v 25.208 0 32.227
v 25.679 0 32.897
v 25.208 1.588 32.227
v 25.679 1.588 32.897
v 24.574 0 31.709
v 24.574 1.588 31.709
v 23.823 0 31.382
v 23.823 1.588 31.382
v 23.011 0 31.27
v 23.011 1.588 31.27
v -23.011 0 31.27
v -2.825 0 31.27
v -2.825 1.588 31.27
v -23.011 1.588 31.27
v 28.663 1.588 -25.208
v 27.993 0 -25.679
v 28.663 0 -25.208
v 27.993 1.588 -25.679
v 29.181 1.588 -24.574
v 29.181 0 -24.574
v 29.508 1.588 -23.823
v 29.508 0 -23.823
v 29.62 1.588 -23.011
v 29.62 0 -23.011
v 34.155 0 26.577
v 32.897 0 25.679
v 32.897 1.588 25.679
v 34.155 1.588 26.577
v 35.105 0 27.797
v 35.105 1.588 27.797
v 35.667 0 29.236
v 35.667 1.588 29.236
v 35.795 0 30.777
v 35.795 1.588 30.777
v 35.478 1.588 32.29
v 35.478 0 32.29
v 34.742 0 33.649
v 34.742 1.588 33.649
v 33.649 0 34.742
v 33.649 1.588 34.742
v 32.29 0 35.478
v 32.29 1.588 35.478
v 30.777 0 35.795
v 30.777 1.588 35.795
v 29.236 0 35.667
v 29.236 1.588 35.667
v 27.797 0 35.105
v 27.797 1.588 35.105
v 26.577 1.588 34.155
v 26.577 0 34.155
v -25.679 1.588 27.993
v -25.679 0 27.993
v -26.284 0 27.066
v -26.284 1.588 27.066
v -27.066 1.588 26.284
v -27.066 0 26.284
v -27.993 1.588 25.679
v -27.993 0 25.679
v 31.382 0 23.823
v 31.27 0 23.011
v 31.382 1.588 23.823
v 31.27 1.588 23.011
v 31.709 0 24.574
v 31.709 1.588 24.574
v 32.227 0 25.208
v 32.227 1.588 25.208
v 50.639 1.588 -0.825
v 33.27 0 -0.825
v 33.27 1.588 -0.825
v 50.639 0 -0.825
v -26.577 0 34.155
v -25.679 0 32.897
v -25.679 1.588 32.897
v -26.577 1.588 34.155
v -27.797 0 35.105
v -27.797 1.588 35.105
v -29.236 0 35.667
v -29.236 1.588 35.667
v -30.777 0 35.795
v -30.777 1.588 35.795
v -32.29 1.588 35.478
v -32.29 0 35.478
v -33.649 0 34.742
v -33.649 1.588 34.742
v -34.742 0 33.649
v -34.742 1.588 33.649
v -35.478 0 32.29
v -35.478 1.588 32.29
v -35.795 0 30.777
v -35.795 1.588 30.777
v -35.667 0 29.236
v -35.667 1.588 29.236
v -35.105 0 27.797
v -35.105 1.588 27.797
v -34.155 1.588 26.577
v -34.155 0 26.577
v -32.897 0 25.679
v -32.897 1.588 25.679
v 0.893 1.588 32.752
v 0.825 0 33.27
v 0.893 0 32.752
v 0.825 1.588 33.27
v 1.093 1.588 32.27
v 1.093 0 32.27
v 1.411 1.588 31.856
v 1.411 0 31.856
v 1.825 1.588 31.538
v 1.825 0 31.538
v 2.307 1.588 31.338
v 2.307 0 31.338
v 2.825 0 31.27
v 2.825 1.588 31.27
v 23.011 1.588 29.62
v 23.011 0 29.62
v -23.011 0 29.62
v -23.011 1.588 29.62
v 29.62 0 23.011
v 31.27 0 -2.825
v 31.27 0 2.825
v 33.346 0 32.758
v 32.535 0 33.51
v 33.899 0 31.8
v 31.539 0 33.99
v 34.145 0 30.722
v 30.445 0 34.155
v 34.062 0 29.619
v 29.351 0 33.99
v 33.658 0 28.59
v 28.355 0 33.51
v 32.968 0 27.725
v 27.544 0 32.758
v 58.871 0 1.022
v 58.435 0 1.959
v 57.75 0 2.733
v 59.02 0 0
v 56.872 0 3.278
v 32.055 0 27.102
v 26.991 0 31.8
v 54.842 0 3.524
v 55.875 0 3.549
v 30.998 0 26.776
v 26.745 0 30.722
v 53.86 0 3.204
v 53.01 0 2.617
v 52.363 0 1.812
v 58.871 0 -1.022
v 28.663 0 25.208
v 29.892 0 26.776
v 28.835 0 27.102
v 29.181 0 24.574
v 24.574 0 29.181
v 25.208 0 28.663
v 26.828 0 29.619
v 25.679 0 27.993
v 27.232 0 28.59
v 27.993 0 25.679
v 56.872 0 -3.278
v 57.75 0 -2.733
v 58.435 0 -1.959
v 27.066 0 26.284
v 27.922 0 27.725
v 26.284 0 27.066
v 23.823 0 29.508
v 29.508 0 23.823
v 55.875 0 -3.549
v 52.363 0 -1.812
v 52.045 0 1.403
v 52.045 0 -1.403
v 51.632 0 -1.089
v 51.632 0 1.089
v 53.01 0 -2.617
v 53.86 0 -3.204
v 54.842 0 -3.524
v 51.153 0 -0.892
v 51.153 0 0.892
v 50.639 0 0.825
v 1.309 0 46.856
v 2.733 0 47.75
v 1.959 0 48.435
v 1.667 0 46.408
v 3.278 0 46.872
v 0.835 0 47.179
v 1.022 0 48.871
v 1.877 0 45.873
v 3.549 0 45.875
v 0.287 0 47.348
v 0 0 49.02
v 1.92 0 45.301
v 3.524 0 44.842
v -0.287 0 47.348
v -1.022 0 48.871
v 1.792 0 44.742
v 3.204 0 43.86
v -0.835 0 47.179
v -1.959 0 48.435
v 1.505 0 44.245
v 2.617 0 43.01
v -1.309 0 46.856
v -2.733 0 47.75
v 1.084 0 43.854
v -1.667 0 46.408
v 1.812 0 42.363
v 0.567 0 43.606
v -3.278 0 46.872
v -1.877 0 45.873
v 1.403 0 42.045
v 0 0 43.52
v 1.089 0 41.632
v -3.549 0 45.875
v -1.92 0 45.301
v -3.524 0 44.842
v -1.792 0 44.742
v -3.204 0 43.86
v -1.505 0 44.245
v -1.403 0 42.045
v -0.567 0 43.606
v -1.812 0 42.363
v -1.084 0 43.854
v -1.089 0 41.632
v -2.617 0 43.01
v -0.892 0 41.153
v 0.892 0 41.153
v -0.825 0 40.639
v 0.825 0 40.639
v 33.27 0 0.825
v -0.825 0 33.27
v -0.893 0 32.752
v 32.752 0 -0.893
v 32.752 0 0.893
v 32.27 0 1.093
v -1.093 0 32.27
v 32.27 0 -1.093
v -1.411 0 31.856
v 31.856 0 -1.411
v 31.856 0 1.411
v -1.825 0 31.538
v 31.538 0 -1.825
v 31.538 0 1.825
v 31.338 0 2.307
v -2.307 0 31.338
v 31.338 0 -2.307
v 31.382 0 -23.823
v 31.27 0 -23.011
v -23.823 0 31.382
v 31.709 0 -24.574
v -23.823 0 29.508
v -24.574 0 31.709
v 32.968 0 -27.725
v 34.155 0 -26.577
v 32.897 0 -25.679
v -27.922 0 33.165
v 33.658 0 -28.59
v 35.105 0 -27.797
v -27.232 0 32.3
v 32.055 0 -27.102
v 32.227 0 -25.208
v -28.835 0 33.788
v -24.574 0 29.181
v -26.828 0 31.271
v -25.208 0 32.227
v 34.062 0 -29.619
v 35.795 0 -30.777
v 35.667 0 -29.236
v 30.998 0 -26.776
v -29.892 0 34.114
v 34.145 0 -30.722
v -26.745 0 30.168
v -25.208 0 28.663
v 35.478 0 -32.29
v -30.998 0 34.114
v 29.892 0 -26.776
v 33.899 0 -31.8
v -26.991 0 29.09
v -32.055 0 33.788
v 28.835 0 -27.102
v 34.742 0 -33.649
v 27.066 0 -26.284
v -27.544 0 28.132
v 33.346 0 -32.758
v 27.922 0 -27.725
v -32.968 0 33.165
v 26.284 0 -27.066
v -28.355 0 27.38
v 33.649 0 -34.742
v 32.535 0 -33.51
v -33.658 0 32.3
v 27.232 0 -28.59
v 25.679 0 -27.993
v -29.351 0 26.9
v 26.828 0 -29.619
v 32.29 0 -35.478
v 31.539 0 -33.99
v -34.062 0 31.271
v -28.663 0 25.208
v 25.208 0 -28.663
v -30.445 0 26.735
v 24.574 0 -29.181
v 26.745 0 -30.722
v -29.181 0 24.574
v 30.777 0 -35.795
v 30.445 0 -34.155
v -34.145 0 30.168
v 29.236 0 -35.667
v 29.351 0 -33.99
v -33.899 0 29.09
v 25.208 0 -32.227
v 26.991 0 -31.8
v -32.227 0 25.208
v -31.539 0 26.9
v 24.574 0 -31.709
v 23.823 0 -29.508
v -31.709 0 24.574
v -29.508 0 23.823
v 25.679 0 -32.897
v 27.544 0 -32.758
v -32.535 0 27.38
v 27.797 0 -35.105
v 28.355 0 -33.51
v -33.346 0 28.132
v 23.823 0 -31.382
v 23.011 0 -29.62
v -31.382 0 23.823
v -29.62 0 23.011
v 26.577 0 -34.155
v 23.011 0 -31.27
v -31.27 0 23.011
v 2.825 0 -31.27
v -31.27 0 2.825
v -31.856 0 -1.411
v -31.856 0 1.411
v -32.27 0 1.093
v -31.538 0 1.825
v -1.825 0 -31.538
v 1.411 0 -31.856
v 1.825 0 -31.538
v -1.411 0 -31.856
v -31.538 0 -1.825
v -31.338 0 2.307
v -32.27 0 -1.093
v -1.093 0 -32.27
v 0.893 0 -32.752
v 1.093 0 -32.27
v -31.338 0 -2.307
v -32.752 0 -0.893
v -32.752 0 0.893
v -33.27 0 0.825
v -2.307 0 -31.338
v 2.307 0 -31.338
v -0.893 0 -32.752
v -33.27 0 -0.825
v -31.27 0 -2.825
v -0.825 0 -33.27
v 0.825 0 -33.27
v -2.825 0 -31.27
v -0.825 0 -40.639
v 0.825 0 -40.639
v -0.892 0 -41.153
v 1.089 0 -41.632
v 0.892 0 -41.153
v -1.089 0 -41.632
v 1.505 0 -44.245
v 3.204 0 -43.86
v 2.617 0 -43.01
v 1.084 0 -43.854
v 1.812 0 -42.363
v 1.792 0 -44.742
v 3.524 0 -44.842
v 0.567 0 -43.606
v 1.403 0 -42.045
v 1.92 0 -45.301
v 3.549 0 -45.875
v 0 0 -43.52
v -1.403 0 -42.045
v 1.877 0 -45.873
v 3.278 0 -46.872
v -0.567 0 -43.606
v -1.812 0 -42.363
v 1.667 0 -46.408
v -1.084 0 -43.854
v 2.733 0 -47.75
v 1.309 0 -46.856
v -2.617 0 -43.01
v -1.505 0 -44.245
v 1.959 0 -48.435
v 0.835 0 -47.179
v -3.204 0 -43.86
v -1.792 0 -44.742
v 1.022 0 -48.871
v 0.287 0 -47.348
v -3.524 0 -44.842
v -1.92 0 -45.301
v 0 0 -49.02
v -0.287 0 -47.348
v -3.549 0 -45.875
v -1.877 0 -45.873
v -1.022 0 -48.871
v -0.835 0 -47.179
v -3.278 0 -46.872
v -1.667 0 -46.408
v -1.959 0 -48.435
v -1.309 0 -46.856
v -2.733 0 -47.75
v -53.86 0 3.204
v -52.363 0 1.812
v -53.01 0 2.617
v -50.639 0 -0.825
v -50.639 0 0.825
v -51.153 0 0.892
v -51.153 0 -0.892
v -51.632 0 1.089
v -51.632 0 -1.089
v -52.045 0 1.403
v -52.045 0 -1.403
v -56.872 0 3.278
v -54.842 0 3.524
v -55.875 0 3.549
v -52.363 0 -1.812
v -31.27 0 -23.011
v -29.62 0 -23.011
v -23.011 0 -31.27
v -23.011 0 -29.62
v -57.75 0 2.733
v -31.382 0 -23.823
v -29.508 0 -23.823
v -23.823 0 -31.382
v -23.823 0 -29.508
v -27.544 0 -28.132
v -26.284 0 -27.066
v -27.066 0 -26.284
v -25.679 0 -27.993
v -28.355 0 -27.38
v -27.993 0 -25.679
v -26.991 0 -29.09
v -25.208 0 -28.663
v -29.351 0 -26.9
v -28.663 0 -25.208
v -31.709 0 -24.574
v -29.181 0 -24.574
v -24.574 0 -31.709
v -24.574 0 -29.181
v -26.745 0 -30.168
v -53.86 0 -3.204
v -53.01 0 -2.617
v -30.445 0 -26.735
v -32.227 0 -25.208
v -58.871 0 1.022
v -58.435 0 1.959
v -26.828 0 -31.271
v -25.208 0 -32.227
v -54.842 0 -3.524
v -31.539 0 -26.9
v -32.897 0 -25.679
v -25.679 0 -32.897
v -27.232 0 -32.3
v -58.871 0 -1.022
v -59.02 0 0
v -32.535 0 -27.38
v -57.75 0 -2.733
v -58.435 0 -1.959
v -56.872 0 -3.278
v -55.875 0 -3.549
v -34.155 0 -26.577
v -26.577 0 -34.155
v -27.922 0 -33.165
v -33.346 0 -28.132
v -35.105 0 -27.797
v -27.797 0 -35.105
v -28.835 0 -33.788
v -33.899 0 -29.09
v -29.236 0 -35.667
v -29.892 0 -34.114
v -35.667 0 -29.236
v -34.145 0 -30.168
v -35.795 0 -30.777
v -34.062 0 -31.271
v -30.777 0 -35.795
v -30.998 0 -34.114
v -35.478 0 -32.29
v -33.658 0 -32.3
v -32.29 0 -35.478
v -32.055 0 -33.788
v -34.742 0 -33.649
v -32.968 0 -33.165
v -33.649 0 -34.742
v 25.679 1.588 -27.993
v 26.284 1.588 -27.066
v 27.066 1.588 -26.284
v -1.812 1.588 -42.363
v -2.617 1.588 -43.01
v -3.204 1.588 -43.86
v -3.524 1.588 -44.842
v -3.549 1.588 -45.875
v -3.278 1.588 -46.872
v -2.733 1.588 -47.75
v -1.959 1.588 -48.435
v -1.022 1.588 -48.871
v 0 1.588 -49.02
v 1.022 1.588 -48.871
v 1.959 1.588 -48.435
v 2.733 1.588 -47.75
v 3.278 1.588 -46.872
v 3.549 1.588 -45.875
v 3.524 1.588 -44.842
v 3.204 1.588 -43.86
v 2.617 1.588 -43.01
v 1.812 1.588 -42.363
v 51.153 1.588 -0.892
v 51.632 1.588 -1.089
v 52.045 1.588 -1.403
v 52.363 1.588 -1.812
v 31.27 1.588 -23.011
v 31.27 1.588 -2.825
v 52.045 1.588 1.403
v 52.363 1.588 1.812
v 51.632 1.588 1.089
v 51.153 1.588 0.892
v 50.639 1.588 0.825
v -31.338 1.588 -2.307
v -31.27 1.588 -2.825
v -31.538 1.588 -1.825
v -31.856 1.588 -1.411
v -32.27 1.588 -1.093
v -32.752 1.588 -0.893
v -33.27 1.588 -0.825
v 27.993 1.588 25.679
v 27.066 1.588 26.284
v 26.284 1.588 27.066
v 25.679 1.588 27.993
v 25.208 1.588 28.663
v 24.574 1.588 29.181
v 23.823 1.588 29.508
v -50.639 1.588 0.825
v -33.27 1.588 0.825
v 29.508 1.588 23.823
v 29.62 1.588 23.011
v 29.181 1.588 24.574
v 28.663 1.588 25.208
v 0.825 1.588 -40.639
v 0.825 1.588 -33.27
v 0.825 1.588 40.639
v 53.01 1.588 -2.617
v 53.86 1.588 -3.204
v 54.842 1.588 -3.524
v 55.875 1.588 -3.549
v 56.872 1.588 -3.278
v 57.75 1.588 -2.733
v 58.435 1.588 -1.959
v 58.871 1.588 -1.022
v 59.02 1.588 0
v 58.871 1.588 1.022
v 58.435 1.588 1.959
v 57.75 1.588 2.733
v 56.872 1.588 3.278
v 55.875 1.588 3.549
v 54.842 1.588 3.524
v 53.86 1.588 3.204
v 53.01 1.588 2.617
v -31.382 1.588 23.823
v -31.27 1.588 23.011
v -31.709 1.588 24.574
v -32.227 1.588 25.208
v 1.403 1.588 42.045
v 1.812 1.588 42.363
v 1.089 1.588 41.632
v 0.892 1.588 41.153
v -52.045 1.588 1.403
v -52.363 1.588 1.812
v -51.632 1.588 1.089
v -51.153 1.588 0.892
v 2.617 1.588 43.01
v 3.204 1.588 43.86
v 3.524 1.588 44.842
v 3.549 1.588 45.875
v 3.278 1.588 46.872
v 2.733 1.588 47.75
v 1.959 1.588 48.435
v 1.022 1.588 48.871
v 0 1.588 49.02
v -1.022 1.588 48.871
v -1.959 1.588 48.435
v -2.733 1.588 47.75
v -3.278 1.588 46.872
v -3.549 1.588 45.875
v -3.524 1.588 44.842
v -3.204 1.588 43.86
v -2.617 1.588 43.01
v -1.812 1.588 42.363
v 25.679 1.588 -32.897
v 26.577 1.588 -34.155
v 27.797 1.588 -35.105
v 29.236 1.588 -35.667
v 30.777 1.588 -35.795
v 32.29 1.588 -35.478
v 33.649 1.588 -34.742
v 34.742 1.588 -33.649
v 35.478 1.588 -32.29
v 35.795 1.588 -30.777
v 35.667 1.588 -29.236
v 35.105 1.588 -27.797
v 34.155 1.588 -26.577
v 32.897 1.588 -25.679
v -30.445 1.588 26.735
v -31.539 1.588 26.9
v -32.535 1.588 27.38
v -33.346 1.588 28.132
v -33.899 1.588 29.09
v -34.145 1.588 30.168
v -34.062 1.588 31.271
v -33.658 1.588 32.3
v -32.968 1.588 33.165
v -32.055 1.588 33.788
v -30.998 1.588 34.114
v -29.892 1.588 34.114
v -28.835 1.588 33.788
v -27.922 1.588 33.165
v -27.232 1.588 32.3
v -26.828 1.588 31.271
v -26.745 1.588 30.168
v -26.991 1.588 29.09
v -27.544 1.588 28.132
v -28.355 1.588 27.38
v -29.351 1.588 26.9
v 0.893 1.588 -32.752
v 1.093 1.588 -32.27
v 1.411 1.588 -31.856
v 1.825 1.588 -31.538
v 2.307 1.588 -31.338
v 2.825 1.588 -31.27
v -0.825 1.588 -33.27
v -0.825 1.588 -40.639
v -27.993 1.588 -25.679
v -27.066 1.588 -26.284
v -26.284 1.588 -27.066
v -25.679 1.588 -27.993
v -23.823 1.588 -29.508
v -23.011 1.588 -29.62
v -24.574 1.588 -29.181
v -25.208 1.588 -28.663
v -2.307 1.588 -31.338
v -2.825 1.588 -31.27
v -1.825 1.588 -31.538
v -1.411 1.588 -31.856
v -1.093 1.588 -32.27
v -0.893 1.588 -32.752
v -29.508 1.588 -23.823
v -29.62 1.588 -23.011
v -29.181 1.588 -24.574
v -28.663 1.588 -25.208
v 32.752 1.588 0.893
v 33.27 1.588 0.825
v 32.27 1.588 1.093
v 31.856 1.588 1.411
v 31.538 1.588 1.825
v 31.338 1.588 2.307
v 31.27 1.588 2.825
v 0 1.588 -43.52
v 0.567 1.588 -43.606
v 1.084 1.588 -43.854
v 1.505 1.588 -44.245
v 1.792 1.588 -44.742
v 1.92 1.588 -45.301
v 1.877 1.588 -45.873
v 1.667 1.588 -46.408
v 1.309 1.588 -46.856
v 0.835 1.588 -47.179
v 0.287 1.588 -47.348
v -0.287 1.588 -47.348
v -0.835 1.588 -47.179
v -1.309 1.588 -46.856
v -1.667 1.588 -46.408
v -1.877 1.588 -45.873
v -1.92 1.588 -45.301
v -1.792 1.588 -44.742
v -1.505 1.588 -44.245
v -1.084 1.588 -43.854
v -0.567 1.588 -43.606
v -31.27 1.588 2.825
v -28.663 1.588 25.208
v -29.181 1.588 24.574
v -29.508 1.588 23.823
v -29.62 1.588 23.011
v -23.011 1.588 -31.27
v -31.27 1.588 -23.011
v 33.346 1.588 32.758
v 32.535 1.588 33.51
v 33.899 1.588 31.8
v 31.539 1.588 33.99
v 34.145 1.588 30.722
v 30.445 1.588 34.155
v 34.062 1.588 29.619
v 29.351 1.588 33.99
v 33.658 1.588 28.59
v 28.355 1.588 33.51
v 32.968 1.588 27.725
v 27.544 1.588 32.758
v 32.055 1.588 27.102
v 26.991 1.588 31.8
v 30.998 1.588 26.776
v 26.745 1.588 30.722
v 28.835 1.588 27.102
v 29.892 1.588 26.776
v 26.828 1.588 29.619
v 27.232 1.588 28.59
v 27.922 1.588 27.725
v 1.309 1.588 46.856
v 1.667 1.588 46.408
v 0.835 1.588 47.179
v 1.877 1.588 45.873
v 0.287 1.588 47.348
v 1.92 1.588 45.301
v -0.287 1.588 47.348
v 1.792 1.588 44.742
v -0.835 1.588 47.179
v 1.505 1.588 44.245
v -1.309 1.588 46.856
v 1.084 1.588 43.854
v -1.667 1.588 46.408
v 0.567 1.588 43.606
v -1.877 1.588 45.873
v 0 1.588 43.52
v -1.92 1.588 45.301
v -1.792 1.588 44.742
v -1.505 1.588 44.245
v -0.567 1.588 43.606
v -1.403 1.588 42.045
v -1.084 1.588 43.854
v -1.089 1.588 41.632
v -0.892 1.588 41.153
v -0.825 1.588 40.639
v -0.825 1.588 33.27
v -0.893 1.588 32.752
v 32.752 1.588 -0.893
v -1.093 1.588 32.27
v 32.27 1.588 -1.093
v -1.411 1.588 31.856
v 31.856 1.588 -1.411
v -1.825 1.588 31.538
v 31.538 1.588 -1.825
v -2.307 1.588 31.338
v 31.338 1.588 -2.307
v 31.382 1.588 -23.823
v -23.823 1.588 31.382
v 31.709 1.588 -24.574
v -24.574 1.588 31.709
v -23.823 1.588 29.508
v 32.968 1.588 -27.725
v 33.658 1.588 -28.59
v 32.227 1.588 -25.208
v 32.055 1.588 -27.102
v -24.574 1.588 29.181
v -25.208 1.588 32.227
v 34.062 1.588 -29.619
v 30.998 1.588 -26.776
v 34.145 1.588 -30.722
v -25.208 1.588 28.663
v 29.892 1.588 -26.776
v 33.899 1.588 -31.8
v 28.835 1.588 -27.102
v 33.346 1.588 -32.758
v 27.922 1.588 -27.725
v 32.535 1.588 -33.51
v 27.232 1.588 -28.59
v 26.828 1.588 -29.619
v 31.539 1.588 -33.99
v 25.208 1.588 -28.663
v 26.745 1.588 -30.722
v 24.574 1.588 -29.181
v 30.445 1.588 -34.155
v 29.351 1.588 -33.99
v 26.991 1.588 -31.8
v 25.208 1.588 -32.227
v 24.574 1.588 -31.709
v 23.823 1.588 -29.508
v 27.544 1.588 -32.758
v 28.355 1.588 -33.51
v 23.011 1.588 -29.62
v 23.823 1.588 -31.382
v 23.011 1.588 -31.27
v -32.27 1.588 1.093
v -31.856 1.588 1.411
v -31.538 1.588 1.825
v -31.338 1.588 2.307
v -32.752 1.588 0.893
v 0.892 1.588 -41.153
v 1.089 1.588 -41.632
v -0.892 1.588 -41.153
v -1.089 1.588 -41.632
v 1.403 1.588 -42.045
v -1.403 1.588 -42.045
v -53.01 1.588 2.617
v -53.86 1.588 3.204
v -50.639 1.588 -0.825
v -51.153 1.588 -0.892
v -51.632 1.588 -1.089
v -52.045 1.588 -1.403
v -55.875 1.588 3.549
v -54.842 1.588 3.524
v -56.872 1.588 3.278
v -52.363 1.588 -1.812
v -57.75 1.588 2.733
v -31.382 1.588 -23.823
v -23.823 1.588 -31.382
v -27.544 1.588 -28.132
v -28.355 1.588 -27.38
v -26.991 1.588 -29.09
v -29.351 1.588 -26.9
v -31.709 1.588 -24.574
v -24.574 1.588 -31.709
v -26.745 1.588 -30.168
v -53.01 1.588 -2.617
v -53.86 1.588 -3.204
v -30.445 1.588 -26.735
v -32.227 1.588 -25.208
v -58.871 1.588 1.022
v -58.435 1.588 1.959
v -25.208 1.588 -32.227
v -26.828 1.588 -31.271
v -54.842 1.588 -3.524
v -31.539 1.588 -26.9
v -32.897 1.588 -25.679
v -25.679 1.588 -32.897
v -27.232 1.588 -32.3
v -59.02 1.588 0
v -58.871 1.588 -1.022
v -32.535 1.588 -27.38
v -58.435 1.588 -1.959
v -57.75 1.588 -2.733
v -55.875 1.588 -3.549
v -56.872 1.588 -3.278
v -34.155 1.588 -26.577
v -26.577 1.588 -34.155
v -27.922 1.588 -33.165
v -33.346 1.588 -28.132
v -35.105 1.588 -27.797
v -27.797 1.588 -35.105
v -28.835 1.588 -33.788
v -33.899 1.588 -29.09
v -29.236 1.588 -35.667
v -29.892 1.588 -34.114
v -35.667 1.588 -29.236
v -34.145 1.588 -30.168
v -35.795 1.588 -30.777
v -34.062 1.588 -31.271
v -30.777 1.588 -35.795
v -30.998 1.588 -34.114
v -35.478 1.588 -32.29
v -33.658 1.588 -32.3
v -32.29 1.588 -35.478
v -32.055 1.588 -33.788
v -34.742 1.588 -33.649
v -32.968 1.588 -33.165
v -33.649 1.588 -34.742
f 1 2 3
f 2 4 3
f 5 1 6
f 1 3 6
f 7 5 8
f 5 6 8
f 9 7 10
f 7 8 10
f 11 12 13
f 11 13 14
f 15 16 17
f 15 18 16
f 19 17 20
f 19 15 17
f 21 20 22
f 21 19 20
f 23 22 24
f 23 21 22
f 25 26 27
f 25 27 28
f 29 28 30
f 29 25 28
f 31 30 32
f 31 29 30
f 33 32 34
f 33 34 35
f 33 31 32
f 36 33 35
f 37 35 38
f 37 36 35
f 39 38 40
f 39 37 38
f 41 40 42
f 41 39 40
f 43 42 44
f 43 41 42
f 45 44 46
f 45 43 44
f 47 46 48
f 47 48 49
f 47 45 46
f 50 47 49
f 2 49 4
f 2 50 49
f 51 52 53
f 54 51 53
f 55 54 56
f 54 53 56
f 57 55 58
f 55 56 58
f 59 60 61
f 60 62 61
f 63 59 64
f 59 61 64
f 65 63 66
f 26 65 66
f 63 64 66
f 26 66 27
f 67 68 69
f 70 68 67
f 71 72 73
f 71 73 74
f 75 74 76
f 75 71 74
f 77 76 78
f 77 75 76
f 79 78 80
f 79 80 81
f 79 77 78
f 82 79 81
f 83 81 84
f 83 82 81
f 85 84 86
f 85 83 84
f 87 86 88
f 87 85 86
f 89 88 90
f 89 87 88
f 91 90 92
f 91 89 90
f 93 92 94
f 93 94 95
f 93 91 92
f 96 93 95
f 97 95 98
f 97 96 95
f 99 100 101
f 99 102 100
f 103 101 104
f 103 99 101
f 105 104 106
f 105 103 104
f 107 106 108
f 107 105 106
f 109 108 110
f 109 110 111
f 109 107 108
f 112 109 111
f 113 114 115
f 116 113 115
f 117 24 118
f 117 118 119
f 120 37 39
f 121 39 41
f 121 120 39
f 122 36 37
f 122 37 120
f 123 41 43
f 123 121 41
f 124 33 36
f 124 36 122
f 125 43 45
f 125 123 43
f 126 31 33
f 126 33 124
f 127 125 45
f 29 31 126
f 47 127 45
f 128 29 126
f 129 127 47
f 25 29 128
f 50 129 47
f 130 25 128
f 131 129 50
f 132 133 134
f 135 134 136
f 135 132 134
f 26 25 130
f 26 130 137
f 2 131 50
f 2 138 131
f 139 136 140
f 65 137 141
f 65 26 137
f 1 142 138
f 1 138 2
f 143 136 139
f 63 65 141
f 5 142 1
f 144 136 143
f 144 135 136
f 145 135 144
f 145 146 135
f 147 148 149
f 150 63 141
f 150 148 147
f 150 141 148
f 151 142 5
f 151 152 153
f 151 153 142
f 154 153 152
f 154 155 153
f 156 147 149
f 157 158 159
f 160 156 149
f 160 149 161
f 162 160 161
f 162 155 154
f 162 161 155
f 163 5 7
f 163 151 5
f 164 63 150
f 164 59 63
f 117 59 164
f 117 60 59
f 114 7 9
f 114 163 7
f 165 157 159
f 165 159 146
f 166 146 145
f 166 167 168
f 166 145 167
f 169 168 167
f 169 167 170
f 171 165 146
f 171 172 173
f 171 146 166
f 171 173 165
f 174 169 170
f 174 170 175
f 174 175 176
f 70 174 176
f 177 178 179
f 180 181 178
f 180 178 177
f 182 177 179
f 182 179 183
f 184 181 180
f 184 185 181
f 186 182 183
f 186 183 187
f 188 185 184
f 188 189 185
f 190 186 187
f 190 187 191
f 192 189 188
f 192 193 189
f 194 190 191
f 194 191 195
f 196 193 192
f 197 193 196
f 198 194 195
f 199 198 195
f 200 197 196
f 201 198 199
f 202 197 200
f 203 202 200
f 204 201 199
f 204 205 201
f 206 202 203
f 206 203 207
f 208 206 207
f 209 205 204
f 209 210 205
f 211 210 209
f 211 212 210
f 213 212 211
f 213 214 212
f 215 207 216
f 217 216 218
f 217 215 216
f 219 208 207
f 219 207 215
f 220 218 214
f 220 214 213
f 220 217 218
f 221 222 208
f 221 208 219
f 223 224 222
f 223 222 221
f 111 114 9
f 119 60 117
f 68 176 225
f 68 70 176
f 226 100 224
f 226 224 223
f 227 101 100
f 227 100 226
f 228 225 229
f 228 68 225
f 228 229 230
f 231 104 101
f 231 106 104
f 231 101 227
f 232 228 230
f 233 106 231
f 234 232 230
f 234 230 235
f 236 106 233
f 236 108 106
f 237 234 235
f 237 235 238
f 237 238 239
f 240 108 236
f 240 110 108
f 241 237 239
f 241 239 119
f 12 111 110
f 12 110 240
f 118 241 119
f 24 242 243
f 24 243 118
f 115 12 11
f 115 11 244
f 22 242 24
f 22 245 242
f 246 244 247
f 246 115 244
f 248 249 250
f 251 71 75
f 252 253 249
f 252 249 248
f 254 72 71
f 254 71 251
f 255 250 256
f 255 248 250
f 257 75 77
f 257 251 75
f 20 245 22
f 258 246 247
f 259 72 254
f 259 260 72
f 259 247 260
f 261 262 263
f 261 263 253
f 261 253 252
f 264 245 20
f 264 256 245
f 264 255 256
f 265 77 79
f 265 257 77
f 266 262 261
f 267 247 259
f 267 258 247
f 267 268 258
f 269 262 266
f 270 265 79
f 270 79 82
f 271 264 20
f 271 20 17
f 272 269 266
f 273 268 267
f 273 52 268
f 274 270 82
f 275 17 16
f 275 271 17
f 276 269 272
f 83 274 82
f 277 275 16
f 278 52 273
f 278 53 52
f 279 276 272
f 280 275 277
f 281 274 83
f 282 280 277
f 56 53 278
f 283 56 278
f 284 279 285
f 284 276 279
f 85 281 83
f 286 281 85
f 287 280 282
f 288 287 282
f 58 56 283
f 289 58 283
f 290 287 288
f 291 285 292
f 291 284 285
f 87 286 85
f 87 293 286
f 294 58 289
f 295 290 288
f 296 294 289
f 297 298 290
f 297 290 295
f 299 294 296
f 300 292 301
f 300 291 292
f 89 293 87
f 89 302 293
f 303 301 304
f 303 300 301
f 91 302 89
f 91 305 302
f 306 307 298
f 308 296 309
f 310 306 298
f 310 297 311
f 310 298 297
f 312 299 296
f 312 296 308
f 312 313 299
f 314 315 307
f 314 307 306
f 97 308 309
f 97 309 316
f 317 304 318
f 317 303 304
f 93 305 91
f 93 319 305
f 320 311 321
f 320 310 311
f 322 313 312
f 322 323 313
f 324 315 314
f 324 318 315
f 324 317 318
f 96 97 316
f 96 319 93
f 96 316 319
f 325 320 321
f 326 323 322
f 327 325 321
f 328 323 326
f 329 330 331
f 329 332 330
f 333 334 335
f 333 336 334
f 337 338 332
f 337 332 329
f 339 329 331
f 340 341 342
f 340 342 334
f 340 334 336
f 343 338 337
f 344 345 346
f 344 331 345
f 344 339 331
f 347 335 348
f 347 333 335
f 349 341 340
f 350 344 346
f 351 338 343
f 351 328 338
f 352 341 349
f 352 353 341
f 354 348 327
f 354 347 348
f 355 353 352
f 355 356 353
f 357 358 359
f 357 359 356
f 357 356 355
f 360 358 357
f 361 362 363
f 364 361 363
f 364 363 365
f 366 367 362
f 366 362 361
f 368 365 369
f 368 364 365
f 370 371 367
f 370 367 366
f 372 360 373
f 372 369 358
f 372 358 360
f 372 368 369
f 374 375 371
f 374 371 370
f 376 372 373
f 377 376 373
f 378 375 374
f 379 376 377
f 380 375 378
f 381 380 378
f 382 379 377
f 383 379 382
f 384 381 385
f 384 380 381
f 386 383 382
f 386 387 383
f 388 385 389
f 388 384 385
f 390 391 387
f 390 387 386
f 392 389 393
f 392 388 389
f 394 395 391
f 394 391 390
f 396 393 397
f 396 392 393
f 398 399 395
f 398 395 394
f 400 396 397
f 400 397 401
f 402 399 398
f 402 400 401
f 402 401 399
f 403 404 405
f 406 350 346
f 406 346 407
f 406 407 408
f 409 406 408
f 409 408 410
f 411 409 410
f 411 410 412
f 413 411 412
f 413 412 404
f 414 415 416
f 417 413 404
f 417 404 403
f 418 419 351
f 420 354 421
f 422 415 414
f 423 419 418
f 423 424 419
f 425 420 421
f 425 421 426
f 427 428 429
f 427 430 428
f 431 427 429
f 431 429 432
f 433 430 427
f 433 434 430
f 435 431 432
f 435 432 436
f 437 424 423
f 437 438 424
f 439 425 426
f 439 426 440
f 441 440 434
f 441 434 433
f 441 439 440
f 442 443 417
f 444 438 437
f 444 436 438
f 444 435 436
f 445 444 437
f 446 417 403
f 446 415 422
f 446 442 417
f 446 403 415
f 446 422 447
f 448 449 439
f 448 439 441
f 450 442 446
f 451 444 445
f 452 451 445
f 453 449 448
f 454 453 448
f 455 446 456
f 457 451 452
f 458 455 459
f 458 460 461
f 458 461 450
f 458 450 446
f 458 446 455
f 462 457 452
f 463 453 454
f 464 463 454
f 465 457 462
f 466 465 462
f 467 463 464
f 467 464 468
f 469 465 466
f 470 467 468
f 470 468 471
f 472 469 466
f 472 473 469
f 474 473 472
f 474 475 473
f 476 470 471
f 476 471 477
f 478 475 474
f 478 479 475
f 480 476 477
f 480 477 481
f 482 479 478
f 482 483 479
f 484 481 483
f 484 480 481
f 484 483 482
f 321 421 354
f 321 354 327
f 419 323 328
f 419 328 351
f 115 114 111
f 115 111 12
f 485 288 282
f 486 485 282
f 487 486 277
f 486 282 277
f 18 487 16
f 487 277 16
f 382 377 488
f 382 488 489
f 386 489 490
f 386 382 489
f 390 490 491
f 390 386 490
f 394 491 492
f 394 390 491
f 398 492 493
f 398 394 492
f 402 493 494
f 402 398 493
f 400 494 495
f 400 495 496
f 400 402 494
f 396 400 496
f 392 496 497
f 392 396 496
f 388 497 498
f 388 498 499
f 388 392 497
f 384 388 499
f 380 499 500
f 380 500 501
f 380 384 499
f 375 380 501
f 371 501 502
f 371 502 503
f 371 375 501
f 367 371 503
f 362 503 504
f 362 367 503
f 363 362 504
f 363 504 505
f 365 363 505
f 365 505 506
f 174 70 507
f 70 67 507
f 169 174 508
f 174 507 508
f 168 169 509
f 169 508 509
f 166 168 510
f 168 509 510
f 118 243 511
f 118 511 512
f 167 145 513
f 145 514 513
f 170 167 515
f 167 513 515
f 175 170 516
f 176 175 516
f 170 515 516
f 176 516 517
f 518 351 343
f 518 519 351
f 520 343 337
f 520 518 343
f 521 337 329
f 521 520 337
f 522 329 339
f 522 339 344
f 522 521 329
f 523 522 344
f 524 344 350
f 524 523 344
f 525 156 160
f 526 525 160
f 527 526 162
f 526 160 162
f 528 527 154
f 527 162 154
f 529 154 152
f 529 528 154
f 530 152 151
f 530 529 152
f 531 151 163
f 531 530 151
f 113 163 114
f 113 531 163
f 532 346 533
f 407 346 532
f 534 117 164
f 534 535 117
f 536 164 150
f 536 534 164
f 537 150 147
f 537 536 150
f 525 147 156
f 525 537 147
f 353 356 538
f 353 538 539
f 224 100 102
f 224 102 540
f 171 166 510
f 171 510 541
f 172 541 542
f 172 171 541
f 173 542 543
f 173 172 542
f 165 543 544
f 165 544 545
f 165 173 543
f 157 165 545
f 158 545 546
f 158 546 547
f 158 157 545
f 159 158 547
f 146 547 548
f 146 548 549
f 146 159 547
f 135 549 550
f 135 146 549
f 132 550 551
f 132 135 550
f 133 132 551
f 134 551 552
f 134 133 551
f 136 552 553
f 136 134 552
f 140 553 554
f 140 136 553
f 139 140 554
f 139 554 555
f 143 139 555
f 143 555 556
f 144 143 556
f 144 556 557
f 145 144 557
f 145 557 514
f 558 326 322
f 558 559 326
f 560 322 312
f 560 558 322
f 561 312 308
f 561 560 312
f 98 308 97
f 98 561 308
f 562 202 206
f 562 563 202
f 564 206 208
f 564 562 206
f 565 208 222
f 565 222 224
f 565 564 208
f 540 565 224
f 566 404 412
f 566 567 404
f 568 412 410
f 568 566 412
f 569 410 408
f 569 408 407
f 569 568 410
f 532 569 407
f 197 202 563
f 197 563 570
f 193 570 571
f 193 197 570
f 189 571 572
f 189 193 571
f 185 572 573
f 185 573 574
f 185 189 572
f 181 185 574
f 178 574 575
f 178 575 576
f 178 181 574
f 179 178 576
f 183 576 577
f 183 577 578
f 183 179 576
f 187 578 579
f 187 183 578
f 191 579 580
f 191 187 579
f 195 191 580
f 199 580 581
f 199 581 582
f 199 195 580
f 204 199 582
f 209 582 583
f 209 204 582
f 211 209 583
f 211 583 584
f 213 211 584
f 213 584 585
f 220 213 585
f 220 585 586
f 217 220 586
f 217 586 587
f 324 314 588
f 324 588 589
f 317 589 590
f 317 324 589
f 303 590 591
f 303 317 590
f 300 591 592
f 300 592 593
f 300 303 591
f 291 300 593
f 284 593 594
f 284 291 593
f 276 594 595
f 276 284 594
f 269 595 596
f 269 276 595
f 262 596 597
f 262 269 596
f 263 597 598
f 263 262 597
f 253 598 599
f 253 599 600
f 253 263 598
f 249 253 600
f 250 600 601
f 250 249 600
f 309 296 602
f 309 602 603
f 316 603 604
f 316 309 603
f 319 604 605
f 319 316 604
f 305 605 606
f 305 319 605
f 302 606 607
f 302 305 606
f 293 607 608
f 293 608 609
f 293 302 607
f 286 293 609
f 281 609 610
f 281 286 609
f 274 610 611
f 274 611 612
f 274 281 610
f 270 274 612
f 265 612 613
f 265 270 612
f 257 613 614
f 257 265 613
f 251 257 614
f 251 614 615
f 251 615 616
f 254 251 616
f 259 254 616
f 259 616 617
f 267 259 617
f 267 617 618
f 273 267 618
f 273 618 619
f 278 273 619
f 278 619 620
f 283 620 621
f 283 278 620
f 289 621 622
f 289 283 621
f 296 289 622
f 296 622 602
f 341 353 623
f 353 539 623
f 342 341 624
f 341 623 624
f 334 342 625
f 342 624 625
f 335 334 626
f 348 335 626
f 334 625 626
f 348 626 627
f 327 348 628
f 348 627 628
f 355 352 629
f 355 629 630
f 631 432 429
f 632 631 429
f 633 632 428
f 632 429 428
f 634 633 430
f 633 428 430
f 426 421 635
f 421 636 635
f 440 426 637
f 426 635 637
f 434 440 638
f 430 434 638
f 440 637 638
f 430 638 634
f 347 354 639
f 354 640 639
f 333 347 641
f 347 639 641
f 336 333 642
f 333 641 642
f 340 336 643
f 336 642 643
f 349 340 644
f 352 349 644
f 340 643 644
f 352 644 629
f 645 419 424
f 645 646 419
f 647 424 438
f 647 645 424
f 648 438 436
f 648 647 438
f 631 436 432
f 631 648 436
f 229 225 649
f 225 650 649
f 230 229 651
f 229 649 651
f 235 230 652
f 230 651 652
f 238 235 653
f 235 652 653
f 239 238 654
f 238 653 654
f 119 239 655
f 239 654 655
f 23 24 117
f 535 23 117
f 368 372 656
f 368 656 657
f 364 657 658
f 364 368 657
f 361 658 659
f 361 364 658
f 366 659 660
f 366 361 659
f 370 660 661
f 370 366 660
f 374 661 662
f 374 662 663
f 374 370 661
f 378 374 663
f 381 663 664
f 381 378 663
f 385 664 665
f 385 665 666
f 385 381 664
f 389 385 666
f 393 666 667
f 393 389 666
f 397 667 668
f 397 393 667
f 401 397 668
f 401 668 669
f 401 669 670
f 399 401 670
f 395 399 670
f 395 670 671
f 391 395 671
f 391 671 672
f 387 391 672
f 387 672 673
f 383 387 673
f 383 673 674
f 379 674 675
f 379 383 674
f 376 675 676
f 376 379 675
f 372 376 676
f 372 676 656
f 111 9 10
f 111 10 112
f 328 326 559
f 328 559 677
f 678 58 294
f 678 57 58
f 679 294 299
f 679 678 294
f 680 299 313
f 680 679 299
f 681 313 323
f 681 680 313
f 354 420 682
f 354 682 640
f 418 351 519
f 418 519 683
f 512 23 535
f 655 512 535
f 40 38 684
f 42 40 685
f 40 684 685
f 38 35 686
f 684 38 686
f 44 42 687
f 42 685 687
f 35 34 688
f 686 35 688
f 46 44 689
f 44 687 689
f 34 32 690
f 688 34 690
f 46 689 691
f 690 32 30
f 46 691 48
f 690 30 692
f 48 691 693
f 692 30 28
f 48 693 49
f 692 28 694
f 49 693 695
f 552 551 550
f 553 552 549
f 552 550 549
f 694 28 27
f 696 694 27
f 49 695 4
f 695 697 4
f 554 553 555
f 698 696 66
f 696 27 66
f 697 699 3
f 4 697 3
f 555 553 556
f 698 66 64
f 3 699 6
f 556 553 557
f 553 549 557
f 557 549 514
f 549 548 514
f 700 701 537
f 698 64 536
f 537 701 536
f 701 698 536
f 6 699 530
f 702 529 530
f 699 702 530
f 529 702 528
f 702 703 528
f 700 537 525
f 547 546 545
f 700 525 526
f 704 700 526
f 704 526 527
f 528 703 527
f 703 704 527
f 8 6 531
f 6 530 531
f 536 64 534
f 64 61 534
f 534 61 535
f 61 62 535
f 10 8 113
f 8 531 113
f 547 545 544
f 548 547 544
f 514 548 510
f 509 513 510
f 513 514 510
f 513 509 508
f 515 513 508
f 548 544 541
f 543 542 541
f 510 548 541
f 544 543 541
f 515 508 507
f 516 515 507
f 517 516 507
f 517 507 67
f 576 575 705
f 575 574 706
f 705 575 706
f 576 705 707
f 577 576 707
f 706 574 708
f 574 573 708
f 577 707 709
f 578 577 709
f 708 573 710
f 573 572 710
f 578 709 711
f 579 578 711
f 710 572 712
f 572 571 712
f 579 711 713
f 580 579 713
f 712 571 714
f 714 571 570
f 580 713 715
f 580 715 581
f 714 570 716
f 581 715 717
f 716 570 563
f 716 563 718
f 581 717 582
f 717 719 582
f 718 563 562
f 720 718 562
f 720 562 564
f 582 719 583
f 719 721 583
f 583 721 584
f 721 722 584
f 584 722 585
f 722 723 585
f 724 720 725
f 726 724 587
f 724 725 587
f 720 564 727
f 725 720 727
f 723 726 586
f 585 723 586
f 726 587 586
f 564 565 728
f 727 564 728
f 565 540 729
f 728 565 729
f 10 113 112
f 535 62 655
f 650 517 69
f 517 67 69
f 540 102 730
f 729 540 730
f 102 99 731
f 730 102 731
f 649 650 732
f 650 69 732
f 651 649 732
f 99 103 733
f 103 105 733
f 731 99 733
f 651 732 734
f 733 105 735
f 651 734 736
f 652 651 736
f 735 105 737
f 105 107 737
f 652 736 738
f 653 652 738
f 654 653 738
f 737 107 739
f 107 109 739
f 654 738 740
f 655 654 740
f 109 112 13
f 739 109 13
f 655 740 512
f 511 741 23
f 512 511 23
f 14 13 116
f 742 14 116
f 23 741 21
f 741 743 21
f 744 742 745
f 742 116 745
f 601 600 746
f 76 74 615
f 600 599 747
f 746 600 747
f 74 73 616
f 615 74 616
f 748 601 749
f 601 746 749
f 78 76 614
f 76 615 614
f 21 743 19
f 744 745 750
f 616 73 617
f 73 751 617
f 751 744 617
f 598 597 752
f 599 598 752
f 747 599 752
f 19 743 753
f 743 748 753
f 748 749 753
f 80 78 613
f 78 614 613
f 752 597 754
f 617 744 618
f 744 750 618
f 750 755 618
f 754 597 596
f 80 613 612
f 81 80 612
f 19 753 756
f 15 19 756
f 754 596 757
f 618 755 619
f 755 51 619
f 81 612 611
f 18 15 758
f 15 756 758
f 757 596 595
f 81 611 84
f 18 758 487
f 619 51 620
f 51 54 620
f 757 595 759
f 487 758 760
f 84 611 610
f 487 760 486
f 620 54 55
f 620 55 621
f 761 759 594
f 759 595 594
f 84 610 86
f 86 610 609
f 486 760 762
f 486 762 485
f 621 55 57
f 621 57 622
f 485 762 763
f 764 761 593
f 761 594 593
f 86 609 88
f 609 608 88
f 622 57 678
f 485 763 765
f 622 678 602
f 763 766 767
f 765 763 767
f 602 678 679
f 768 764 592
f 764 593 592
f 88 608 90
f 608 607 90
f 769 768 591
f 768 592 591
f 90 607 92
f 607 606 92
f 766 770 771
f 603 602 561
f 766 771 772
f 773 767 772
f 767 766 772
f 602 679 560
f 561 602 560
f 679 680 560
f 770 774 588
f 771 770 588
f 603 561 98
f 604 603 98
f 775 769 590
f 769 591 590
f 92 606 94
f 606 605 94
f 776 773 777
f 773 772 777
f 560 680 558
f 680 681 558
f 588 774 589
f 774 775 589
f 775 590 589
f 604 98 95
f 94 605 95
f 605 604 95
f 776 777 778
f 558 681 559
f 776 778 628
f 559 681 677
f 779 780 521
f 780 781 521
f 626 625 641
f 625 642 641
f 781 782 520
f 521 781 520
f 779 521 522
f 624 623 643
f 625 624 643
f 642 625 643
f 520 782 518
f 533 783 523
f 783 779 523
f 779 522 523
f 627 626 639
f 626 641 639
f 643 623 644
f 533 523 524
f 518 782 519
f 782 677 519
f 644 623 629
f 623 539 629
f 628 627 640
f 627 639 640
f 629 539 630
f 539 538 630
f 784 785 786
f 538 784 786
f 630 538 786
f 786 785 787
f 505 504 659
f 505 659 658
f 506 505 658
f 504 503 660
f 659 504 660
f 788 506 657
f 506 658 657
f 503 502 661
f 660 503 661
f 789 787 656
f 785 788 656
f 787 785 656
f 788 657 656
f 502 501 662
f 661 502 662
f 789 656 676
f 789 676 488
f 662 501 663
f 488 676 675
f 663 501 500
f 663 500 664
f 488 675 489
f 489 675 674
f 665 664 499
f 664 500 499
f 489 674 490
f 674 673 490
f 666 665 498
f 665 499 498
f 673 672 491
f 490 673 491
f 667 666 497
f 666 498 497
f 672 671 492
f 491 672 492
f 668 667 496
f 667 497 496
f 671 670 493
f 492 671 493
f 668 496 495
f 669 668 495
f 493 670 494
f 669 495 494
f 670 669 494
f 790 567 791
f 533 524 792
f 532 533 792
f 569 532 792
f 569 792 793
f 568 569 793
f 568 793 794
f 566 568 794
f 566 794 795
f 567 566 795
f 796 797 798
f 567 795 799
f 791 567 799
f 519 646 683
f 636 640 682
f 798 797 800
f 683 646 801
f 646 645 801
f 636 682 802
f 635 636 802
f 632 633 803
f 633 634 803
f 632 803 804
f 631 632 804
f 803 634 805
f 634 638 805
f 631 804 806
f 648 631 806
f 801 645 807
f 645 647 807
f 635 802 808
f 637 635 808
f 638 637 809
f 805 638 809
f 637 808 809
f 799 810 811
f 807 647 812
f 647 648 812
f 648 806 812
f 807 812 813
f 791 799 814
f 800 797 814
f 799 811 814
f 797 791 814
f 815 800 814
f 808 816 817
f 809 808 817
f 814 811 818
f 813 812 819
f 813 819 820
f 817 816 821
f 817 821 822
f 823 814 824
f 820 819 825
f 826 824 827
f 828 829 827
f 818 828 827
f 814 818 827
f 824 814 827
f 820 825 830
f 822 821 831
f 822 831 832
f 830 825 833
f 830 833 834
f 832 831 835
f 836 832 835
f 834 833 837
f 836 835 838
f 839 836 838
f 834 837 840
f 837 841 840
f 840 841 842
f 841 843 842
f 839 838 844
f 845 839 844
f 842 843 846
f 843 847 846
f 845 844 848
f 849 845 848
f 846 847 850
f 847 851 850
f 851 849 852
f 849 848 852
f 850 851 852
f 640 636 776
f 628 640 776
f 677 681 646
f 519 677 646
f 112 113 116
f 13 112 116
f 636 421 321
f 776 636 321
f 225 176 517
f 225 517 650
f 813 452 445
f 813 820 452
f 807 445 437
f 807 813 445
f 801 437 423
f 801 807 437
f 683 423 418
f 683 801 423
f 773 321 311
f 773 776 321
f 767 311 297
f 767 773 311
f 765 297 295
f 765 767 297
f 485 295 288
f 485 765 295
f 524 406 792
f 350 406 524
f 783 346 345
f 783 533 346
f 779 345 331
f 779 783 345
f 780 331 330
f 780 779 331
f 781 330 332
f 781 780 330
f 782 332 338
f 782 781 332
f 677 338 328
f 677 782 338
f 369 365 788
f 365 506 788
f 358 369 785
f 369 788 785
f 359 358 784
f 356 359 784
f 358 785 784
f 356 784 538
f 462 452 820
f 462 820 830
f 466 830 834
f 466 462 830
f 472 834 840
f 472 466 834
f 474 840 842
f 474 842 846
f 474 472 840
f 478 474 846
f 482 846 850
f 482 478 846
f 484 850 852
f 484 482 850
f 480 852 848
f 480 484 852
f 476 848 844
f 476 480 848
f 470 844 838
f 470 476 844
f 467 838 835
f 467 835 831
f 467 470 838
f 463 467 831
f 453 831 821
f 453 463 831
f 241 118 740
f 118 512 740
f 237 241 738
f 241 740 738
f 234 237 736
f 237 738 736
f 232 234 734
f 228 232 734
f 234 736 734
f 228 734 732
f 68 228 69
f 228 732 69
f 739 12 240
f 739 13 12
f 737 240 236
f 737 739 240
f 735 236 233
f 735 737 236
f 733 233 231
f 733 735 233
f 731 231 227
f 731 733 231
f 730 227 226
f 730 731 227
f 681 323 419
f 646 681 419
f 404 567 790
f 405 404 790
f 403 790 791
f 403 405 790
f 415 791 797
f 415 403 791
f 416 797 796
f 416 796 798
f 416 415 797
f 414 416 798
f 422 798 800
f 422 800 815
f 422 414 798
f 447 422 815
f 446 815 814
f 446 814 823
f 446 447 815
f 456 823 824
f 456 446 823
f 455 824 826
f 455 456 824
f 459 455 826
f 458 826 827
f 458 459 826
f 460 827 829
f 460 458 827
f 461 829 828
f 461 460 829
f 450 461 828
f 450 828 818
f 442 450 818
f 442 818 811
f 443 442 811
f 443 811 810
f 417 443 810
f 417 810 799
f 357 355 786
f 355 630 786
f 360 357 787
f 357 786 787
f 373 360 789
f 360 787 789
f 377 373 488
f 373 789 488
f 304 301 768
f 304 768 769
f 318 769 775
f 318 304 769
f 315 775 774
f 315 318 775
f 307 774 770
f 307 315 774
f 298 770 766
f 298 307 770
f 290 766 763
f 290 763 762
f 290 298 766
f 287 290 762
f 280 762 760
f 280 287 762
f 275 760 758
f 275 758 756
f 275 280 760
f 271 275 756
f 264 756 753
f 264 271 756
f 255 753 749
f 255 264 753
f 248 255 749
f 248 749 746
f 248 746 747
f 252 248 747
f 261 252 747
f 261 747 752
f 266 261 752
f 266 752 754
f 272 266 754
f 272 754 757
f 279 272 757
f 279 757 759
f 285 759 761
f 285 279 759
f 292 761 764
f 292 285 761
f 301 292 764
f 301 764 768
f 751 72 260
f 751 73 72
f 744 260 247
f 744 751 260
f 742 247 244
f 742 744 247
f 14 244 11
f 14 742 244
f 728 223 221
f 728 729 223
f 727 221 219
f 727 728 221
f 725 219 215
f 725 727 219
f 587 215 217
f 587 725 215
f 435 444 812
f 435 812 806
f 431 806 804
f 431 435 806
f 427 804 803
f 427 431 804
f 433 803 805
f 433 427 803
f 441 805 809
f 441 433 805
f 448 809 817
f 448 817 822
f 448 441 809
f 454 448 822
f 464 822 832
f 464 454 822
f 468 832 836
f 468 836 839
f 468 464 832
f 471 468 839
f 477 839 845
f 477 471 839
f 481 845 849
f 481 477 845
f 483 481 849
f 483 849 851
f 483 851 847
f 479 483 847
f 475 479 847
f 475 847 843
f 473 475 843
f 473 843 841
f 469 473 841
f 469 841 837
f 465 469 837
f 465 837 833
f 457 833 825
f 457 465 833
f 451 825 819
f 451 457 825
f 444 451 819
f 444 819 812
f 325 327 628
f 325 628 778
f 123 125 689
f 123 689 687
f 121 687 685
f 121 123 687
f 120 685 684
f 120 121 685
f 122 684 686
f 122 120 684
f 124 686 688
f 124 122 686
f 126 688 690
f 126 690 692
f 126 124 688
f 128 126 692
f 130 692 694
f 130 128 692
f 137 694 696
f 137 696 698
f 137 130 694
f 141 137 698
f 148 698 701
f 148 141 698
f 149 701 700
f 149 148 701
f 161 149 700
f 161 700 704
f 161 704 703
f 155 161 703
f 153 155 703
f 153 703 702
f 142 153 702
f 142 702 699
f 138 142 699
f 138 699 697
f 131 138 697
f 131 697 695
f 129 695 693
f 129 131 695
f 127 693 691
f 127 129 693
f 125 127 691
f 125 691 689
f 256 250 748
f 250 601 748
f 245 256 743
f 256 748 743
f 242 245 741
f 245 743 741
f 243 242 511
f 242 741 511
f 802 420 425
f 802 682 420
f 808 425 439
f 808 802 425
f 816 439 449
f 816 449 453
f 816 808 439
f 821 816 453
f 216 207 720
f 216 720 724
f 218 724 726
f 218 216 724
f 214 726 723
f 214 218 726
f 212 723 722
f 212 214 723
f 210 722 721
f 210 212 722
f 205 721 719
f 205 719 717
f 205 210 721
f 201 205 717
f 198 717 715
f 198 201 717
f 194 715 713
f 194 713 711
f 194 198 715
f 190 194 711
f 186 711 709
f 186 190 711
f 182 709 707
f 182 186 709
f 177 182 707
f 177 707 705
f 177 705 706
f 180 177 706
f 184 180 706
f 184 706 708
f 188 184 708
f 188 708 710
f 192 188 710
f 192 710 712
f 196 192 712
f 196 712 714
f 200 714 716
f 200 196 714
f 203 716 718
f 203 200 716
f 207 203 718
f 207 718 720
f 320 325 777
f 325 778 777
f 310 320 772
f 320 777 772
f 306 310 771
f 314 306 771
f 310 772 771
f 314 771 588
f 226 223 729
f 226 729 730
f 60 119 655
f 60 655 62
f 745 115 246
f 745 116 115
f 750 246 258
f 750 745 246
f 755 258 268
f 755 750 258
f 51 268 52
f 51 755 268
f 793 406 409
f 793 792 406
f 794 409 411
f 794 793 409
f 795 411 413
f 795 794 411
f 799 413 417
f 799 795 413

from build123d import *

# Parameters (mm, degrees)
SKETCH1_R           = 3.71
SKETCH1_R_2         = 1.925
BOSS_EXTRUDE1_DEPTH = 1.5875
FILLET1_R           = 3
FILLET2_R           = 2
FILLET3_R           = 2


with BuildPart() as part:
    # Sketch1 → Boss-Extrude1 (new body)
    with BuildSketch(Plane(origin=(0, 0, 0), x_dir=(1, 0, 0), z_dir=(0, 1, 0))):
        with BuildLine():
            Line((-25.148871697, 31.27), (-0.825, 31.27))
            Line((-0.825, 31.27), (-0.825, 41.966494574))
            ThreePointArc((-0.825, 41.966494574), (0, 49.02), (0.825, 41.966494574))
            Line((0.825, 41.966494574), (0.825, 31.27))
            Line((0.825, 31.27), (25.148871697, 31.27))
            ThreePointArc((25.148871697, 31.27), (34.235092347, 34.235092347), (31.27, 25.148871697))
            Line((31.27, 25.148871697), (31.27, 0.825))
            Line((31.27, 0.825), (51.966494574, 0.825))
            ThreePointArc((51.966494574, 0.825), (59.02, 0), (51.966494574, -0.825))
            Line((51.966494574, -0.825), (31.27, -0.825))
            Line((31.27, -0.825), (31.27, -25.148871697))
            ThreePointArc((31.27, -25.148871697), (34.235092347, -34.235092347), (25.148871697, -31.27))
            Line((25.148871697, -31.27), (0.825, -31.27))
            Line((0.825, -31.27), (0.825, -41.966494574))
            ThreePointArc((0.825, -41.966494574), (0, -49.02), (-0.825, -41.966494574))
            Line((-0.825, -41.966494574), (-0.825, -31.27))
            Line((-0.825, -31.27), (-25.148871697, -31.27))
            ThreePointArc((-25.148871697, -31.27), (-34.235092347, -34.235092347), (-31.27, -25.148871697))
            Line((-31.27, -25.148871697), (-31.27, -0.825))
            Line((-31.27, -0.825), (-51.966494574, -0.825))
            ThreePointArc((-51.966494574, -0.825), (-59.02, 0), (-51.966494574, 0.825))
            Line((-51.966494574, 0.825), (-31.27, 0.825))
            Line((-31.27, 0.825), (-31.27, 25.148871697))
            ThreePointArc((-31.27, 25.148871697), (-34.235092347, 34.235092347), (-25.148871697, 31.27))
        make_face()
        with Locations(Location((-30.445, 30.445, 0), (0, 0, 270))):
            Circle(SKETCH1_R, mode=Mode.SUBTRACT)
        with Locations(Location((30.445, 30.445, 0), (0, 0, 90))):
            Circle(SKETCH1_R, mode=Mode.SUBTRACT)
        with Locations(Location((30.445, -30.445, 0), (0, 0, 270))):
            Circle(SKETCH1_R, mode=Mode.SUBTRACT)
        with Locations(Location((-30.445, -30.445, 0), (0, 0, 90))):
            Circle(SKETCH1_R, mode=Mode.SUBTRACT)
        with Locations(Location((0, 45.445, 0), (0, 0, 270))):
            Circle(SKETCH1_R_2, mode=Mode.SUBTRACT)
        with Locations(Location((0, -45.445, 0), (0, 0, 90))):
            Circle(SKETCH1_R_2, mode=Mode.SUBTRACT)
        with BuildLine():
            Line((-25.148871697, 29.62), (25.148871697, 29.62))
            ThreePointArc((25.148871697, 29.62), (26.654907653, 26.654907653), (29.62, 25.148871697))
            Line((29.62, 25.148871697), (29.62, -25.148871697))
            ThreePointArc((29.62, -25.148871697), (26.654907653, -26.654907653), (25.148871697, -29.62))
            Line((25.148871697, -29.62), (-25.148871697, -29.62))
            ThreePointArc((-25.148871697, -29.62), (-26.654907653, -26.654907653), (-29.62, -25.148871697))
            Line((-29.62, -25.148871697), (-29.62, 25.148871697))
            ThreePointArc((-29.62, 25.148871697), (-26.654907653, 26.654907653), (-25.148871697, 29.62))
        make_face(mode=Mode.SUBTRACT)
    extrude(amount=BOSS_EXTRUDE1_DEPTH)

    # Fillet1
    fillet1_edges = [part.edges().sort_by_distance(p)[0] for p in [
        (25.148871697, 0.79375, -31.27),
        (31.27, 0.79375, -25.148871697),
        (31.27, 0.79375, 25.148871697),
        (25.148871697, 0.79375, 31.27),
        (-25.148871697, 0.79375, 31.27),
        (-31.27, 0.79375, 25.148871697),
        (-31.27, 0.79375, -25.148871697),
        (-25.148871697, 0.79375, -31.27),
        (-25.148871697, 0.79375, -29.62),
        (-29.62, 0.79375, -25.148871697),
        (-29.62, 0.79375, 25.148871697),
        (-25.148871697, 0.79375, 29.62),
        (25.148871697, 0.79375, 29.62),
        (29.62, 0.79375, 25.148871697),
        (29.62, 0.79375, -25.148871697),
        (25.148871697, 0.79375, -29.62),
    ]]
    fillet(fillet1_edges, radius=FILLET1_R)

    # Fillet2
    fillet2_edges = [part.edges().sort_by_distance(p)[0] for p in [
        (0.825, 0.79375, -31.27),
        (31.27, 0.79375, -0.825),
        (31.27, 0.79375, 0.825),
        (0.825, 0.79375, 31.27),
        (-0.825, 0.79375, 31.27),
        (-31.27, 0.79375, 0.825),
        (-31.27, 0.79375, -0.825),
        (-0.825, 0.79375, -31.27),
    ]]
    fillet(fillet2_edges, radius=FILLET2_R)

    # Fillet3
    fillet3_edges = [part.edges().sort_by_distance(p)[0] for p in [
        (0.825, 0.79375, -41.966494574),
        (51.966494574, 0.79375, -0.825),
        (51.966494574, 0.79375, 0.825),
        (0.825, 0.79375, 41.966494574),
        (-0.825, 0.79375, 41.966494574),
        (-51.966494574, 0.79375, 0.825),
        (-51.966494574, 0.79375, -0.825),
        (-0.825, 0.79375, -41.966494574),
    ]]
    fillet(fillet3_edges, radius=FILLET3_R)


solid = part.part
